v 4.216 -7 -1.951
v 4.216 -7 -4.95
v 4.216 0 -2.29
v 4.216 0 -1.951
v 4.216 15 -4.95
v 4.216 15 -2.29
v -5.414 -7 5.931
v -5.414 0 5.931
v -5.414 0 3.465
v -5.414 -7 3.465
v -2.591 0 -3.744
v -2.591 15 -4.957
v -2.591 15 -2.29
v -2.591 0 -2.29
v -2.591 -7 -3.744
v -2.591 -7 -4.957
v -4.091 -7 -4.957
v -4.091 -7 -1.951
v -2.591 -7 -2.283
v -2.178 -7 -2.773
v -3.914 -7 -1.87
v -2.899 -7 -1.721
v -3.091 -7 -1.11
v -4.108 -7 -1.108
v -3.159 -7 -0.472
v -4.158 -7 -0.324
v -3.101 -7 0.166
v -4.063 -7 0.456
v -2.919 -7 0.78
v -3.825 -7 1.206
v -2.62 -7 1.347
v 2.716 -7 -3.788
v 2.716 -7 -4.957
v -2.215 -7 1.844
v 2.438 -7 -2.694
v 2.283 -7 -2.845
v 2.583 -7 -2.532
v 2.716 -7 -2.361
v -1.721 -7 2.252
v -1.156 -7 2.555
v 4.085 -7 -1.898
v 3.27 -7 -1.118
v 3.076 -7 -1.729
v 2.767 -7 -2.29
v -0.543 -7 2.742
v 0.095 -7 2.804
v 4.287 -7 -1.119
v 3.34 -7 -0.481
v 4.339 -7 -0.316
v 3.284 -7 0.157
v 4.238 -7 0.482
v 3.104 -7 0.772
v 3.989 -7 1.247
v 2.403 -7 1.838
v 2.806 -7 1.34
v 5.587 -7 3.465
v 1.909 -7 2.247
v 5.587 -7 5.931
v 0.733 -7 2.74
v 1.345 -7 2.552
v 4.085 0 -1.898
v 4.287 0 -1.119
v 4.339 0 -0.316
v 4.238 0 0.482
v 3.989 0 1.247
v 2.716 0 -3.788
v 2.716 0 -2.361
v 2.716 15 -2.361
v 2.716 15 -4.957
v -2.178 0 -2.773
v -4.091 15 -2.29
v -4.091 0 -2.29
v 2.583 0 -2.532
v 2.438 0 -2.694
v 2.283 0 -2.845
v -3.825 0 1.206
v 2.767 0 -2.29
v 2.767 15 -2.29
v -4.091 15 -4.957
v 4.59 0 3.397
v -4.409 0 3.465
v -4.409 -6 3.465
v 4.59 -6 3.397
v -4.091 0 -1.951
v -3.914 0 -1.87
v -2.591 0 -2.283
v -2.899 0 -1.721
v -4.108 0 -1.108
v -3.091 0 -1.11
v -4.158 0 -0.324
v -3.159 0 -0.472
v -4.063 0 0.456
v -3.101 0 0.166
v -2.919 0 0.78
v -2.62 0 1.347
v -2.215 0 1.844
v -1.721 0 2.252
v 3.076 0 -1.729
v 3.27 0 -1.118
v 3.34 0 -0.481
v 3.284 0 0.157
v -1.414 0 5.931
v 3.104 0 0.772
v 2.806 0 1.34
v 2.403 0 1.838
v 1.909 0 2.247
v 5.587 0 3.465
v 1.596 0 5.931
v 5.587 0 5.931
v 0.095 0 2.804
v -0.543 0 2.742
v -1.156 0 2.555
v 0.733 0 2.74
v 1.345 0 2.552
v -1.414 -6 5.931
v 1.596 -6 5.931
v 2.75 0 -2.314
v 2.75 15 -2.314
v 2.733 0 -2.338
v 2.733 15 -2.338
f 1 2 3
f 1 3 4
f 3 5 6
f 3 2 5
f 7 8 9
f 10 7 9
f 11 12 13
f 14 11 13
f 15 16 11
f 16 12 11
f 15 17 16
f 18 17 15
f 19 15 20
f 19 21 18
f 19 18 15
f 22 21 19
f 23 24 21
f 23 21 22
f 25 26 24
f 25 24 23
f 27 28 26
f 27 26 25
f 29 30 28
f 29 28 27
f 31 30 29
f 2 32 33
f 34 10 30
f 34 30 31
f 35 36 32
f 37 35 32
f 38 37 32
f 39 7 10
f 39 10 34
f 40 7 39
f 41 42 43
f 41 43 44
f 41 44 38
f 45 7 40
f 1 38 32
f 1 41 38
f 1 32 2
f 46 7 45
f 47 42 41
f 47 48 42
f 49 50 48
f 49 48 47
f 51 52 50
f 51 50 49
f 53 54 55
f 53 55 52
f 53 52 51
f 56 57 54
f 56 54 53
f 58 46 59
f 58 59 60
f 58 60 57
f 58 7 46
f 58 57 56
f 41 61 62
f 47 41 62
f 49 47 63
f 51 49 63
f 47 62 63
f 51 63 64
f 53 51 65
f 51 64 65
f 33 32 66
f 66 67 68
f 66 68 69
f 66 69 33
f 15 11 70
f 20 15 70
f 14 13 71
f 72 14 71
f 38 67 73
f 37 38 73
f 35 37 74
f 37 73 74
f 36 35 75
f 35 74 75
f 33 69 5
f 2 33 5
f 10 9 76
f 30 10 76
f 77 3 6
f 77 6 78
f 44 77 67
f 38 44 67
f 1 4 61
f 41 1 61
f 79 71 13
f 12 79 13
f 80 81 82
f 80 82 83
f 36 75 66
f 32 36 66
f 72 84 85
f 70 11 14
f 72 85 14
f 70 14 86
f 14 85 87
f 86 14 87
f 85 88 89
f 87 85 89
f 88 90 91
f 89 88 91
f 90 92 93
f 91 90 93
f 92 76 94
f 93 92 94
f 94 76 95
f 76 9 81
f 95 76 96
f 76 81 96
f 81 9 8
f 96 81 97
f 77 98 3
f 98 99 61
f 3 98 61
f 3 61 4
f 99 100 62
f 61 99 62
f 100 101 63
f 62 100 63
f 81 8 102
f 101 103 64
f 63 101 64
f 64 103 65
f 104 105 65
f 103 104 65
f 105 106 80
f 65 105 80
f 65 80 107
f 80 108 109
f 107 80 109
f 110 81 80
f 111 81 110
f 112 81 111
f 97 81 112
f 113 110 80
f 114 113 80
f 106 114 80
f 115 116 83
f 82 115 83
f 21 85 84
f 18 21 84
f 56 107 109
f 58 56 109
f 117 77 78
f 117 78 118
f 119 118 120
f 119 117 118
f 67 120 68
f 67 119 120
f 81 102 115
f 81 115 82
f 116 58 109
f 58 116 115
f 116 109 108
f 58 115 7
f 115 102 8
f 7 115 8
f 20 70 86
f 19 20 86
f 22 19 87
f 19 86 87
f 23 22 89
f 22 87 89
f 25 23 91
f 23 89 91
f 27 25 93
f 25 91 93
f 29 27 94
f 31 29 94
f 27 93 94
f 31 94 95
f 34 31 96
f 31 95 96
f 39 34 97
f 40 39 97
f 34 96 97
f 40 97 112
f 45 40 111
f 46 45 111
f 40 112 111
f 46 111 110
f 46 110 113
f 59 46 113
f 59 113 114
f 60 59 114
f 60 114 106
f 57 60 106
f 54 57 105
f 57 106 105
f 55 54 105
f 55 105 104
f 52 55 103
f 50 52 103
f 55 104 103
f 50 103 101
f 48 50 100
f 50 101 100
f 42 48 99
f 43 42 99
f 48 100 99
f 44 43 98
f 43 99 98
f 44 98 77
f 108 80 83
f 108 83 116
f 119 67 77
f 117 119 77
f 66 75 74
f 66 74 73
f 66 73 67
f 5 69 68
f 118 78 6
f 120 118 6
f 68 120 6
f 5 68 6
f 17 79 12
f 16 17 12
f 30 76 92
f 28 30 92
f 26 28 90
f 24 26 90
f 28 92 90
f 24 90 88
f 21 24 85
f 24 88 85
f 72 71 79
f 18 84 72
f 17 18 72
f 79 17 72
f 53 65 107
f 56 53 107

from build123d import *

# Parameters (mm, degrees)
F1_DEPTH = 7
F2_DEPTH = 6
F3_DEPTH = 15


# Not quite as in the source:
# - a feature names something its author has since deleted; it is built from what else it names


with BuildPart() as f1:
    # F0 (on Front) → F1 (new body)
    with BuildSketch(Plane.XZ):
        with BuildLine():
            Line((-3.9138396984, -1.8700768013), (-3.3236176952, -1.6008211246))
            Line((-3.3236176952, -1.6008211246), (-3.3236176952, -2.2903047641))
            Line((-3.3236176952, -2.2903047641), (-2.590710345, -2.2903047641))
            Line((-2.590710345, -2.2903047641), (-2.590710345, -3.7436034497))
            Line((-2.590710345, -3.7436034497), (-2.1779115118, -2.7734910012))
            ThreePointArc((-2.1779115118, -2.7734910012), (-0.2255882059, 2.7885019734), (2.7665772748, -2.2903047641))
            Line((2.7665772748, -2.2903047641), (3.4491920394, -2.2903047641))
            Line((3.4491920394, -2.2903047641), (3.4491920394, -1.6408955531))
            Line((3.4491920394, -1.6408955531), (4.0849162776, -1.8976975874))
            ThreePointArc((4.0849162776, -1.8976975874), (4.3385221106, -0.3163391945), (3.988877441, 1.2465935905))
            Line((3.988877441, 1.2465935905), (5.5865912817, 3.465253188))
            Line((5.5865912817, 3.465253188), (5.5865912817, 5.931237081))
            Line((5.5865912817, 5.931237081), (1.5955031972, 5.931237081))
            Line((1.5955031972, 5.931237081), (4.5903746292, 3.397220974))
            Line((4.5903746292, 3.397220974), (0.0905031972, 3.431237081))
            Line((0.0905031972, 3.431237081), (-4.4093682348, 3.465253188))
            Line((-4.4093682348, 3.465253188), (-1.4144968028, 5.931237081))
            Line((-1.4144968028, 5.931237081), (-5.4144968028, 5.931237081))
            Line((-5.4144968028, 5.931237081), (-5.4144968028, 3.465253188))
            Line((-5.4144968028, 3.465253188), (-3.8254308087, 1.2055638243))
            ThreePointArc((-3.8254308087, 1.2055638243), (-4.1577420716, -0.3239748955), (-3.9138396984, -1.8700768013))
        make_face()
        Polygon((-3.3236176952, -2.2903047641), (-3.3236176952, -1.6008211246), (-3.9138396984, -1.8700768013), (-4.090710345, -1.9507641112), (-4.090710345, -2.2903047641), align=None)
        Polygon((-2.590710345, -2.2903047641), (-3.3236176952, -2.2903047641), (-4.090710345, -2.2903047641), (-4.090710345, -4.9565606735), (-3.3236176952, -4.9565606735), (-2.590710345, -4.9565606735), (-2.590710345, -3.7436034497), align=None)
        with BuildLine():
            Line((3.4491920394, -2.2903047641), (2.7665772748, -2.2903047641))
            ThreePointArc((2.7665772748, -2.2903047641), (2.7416681899, -2.3259370036), (2.7162846892, -2.3612328517))
            Line((2.7162846892, -2.3612328517), (2.7162846892, -3.7879117456))
            Line((2.7162846892, -3.7879117456), (2.7162846892, -4.9565606735))
            Line((2.7162846892, -4.9565606735), (4.2162846892, -4.9497258588))
            Line((4.2162846892, -4.9497258588), (4.2162846892, -2.2903047641))
            Line((4.2162846892, -2.2903047641), (3.4491920394, -2.2903047641))
        make_face()
        with BuildLine():
            ThreePointArc((2.7162846892, -2.3612328517), (2.7416681899, -2.3259370036), (2.7665772748, -2.2903047641))
            Line((2.7665772748, -2.2903047641), (2.7162846892, -2.3612328517))
        make_face()
        Polygon((1.5955031972, 5.931237081), (-1.4144968028, 5.931237081), (-4.4093682348, 3.465253188), (0.0905031972, 3.431237081), (4.5903746292, 3.397220974), align=None)
        with BuildLine():
            Line((2.7162846892, -3.7879117456), (2.7162846892, -2.3612328517))
            ThreePointArc((2.7162846892, -2.3612328517), (2.5117247114, -2.6140814767), (2.2829176272, -2.8452189465))
            Line((2.2829176272, -2.8452189465), (2.7162846892, -3.7879117456))
        make_face()
        Polygon((3.4491920394, -1.6408955531), (3.4491920394, -2.2903047641), (4.2162846892, -2.2903047641), (4.2162846892, -1.9507641112), (4.0849162776, -1.8976975874), align=None)
    extrude(amount=F1_DEPTH)

    # F0 (on Front) → F2 (cut)
    with BuildSketch(Plane.XZ):
        Polygon((1.5955031972, 5.931237081), (-1.4144968028, 5.931237081), (-4.4093682348, 3.465253188), (0.0905031972, 3.431237081), (4.5903746292, 3.397220974), align=None)
    extrude(amount=F2_DEPTH, mode=Mode.SUBTRACT)

    # F0 (on Front) → F3 (join)
    with BuildSketch(Plane.XZ):
        Polygon((-2.590710345, -2.2903047641), (-3.3236176952, -2.2903047641), (-4.090710345, -2.2903047641), (-4.090710345, -4.9565606735), (-3.3236176952, -4.9565606735), (-2.590710345, -4.9565606735), (-2.590710345, -3.7436034497), align=None)
        with BuildLine():
            Line((3.4491920394, -2.2903047641), (2.7665772748, -2.2903047641))
            ThreePointArc((2.7665772748, -2.2903047641), (2.7416681899, -2.3259370036), (2.7162846892, -2.3612328517))
            Line((2.7162846892, -2.3612328517), (2.7162846892, -3.7879117456))
            Line((2.7162846892, -3.7879117456), (2.7162846892, -4.9565606735))
            Line((2.7162846892, -4.9565606735), (4.2162846892, -4.9497258588))
            Line((4.2162846892, -4.9497258588), (4.2162846892, -2.2903047641))
            Line((4.2162846892, -2.2903047641), (3.4491920394, -2.2903047641))
        make_face()
    extrude(amount=-F3_DEPTH)


solid = f1.part
